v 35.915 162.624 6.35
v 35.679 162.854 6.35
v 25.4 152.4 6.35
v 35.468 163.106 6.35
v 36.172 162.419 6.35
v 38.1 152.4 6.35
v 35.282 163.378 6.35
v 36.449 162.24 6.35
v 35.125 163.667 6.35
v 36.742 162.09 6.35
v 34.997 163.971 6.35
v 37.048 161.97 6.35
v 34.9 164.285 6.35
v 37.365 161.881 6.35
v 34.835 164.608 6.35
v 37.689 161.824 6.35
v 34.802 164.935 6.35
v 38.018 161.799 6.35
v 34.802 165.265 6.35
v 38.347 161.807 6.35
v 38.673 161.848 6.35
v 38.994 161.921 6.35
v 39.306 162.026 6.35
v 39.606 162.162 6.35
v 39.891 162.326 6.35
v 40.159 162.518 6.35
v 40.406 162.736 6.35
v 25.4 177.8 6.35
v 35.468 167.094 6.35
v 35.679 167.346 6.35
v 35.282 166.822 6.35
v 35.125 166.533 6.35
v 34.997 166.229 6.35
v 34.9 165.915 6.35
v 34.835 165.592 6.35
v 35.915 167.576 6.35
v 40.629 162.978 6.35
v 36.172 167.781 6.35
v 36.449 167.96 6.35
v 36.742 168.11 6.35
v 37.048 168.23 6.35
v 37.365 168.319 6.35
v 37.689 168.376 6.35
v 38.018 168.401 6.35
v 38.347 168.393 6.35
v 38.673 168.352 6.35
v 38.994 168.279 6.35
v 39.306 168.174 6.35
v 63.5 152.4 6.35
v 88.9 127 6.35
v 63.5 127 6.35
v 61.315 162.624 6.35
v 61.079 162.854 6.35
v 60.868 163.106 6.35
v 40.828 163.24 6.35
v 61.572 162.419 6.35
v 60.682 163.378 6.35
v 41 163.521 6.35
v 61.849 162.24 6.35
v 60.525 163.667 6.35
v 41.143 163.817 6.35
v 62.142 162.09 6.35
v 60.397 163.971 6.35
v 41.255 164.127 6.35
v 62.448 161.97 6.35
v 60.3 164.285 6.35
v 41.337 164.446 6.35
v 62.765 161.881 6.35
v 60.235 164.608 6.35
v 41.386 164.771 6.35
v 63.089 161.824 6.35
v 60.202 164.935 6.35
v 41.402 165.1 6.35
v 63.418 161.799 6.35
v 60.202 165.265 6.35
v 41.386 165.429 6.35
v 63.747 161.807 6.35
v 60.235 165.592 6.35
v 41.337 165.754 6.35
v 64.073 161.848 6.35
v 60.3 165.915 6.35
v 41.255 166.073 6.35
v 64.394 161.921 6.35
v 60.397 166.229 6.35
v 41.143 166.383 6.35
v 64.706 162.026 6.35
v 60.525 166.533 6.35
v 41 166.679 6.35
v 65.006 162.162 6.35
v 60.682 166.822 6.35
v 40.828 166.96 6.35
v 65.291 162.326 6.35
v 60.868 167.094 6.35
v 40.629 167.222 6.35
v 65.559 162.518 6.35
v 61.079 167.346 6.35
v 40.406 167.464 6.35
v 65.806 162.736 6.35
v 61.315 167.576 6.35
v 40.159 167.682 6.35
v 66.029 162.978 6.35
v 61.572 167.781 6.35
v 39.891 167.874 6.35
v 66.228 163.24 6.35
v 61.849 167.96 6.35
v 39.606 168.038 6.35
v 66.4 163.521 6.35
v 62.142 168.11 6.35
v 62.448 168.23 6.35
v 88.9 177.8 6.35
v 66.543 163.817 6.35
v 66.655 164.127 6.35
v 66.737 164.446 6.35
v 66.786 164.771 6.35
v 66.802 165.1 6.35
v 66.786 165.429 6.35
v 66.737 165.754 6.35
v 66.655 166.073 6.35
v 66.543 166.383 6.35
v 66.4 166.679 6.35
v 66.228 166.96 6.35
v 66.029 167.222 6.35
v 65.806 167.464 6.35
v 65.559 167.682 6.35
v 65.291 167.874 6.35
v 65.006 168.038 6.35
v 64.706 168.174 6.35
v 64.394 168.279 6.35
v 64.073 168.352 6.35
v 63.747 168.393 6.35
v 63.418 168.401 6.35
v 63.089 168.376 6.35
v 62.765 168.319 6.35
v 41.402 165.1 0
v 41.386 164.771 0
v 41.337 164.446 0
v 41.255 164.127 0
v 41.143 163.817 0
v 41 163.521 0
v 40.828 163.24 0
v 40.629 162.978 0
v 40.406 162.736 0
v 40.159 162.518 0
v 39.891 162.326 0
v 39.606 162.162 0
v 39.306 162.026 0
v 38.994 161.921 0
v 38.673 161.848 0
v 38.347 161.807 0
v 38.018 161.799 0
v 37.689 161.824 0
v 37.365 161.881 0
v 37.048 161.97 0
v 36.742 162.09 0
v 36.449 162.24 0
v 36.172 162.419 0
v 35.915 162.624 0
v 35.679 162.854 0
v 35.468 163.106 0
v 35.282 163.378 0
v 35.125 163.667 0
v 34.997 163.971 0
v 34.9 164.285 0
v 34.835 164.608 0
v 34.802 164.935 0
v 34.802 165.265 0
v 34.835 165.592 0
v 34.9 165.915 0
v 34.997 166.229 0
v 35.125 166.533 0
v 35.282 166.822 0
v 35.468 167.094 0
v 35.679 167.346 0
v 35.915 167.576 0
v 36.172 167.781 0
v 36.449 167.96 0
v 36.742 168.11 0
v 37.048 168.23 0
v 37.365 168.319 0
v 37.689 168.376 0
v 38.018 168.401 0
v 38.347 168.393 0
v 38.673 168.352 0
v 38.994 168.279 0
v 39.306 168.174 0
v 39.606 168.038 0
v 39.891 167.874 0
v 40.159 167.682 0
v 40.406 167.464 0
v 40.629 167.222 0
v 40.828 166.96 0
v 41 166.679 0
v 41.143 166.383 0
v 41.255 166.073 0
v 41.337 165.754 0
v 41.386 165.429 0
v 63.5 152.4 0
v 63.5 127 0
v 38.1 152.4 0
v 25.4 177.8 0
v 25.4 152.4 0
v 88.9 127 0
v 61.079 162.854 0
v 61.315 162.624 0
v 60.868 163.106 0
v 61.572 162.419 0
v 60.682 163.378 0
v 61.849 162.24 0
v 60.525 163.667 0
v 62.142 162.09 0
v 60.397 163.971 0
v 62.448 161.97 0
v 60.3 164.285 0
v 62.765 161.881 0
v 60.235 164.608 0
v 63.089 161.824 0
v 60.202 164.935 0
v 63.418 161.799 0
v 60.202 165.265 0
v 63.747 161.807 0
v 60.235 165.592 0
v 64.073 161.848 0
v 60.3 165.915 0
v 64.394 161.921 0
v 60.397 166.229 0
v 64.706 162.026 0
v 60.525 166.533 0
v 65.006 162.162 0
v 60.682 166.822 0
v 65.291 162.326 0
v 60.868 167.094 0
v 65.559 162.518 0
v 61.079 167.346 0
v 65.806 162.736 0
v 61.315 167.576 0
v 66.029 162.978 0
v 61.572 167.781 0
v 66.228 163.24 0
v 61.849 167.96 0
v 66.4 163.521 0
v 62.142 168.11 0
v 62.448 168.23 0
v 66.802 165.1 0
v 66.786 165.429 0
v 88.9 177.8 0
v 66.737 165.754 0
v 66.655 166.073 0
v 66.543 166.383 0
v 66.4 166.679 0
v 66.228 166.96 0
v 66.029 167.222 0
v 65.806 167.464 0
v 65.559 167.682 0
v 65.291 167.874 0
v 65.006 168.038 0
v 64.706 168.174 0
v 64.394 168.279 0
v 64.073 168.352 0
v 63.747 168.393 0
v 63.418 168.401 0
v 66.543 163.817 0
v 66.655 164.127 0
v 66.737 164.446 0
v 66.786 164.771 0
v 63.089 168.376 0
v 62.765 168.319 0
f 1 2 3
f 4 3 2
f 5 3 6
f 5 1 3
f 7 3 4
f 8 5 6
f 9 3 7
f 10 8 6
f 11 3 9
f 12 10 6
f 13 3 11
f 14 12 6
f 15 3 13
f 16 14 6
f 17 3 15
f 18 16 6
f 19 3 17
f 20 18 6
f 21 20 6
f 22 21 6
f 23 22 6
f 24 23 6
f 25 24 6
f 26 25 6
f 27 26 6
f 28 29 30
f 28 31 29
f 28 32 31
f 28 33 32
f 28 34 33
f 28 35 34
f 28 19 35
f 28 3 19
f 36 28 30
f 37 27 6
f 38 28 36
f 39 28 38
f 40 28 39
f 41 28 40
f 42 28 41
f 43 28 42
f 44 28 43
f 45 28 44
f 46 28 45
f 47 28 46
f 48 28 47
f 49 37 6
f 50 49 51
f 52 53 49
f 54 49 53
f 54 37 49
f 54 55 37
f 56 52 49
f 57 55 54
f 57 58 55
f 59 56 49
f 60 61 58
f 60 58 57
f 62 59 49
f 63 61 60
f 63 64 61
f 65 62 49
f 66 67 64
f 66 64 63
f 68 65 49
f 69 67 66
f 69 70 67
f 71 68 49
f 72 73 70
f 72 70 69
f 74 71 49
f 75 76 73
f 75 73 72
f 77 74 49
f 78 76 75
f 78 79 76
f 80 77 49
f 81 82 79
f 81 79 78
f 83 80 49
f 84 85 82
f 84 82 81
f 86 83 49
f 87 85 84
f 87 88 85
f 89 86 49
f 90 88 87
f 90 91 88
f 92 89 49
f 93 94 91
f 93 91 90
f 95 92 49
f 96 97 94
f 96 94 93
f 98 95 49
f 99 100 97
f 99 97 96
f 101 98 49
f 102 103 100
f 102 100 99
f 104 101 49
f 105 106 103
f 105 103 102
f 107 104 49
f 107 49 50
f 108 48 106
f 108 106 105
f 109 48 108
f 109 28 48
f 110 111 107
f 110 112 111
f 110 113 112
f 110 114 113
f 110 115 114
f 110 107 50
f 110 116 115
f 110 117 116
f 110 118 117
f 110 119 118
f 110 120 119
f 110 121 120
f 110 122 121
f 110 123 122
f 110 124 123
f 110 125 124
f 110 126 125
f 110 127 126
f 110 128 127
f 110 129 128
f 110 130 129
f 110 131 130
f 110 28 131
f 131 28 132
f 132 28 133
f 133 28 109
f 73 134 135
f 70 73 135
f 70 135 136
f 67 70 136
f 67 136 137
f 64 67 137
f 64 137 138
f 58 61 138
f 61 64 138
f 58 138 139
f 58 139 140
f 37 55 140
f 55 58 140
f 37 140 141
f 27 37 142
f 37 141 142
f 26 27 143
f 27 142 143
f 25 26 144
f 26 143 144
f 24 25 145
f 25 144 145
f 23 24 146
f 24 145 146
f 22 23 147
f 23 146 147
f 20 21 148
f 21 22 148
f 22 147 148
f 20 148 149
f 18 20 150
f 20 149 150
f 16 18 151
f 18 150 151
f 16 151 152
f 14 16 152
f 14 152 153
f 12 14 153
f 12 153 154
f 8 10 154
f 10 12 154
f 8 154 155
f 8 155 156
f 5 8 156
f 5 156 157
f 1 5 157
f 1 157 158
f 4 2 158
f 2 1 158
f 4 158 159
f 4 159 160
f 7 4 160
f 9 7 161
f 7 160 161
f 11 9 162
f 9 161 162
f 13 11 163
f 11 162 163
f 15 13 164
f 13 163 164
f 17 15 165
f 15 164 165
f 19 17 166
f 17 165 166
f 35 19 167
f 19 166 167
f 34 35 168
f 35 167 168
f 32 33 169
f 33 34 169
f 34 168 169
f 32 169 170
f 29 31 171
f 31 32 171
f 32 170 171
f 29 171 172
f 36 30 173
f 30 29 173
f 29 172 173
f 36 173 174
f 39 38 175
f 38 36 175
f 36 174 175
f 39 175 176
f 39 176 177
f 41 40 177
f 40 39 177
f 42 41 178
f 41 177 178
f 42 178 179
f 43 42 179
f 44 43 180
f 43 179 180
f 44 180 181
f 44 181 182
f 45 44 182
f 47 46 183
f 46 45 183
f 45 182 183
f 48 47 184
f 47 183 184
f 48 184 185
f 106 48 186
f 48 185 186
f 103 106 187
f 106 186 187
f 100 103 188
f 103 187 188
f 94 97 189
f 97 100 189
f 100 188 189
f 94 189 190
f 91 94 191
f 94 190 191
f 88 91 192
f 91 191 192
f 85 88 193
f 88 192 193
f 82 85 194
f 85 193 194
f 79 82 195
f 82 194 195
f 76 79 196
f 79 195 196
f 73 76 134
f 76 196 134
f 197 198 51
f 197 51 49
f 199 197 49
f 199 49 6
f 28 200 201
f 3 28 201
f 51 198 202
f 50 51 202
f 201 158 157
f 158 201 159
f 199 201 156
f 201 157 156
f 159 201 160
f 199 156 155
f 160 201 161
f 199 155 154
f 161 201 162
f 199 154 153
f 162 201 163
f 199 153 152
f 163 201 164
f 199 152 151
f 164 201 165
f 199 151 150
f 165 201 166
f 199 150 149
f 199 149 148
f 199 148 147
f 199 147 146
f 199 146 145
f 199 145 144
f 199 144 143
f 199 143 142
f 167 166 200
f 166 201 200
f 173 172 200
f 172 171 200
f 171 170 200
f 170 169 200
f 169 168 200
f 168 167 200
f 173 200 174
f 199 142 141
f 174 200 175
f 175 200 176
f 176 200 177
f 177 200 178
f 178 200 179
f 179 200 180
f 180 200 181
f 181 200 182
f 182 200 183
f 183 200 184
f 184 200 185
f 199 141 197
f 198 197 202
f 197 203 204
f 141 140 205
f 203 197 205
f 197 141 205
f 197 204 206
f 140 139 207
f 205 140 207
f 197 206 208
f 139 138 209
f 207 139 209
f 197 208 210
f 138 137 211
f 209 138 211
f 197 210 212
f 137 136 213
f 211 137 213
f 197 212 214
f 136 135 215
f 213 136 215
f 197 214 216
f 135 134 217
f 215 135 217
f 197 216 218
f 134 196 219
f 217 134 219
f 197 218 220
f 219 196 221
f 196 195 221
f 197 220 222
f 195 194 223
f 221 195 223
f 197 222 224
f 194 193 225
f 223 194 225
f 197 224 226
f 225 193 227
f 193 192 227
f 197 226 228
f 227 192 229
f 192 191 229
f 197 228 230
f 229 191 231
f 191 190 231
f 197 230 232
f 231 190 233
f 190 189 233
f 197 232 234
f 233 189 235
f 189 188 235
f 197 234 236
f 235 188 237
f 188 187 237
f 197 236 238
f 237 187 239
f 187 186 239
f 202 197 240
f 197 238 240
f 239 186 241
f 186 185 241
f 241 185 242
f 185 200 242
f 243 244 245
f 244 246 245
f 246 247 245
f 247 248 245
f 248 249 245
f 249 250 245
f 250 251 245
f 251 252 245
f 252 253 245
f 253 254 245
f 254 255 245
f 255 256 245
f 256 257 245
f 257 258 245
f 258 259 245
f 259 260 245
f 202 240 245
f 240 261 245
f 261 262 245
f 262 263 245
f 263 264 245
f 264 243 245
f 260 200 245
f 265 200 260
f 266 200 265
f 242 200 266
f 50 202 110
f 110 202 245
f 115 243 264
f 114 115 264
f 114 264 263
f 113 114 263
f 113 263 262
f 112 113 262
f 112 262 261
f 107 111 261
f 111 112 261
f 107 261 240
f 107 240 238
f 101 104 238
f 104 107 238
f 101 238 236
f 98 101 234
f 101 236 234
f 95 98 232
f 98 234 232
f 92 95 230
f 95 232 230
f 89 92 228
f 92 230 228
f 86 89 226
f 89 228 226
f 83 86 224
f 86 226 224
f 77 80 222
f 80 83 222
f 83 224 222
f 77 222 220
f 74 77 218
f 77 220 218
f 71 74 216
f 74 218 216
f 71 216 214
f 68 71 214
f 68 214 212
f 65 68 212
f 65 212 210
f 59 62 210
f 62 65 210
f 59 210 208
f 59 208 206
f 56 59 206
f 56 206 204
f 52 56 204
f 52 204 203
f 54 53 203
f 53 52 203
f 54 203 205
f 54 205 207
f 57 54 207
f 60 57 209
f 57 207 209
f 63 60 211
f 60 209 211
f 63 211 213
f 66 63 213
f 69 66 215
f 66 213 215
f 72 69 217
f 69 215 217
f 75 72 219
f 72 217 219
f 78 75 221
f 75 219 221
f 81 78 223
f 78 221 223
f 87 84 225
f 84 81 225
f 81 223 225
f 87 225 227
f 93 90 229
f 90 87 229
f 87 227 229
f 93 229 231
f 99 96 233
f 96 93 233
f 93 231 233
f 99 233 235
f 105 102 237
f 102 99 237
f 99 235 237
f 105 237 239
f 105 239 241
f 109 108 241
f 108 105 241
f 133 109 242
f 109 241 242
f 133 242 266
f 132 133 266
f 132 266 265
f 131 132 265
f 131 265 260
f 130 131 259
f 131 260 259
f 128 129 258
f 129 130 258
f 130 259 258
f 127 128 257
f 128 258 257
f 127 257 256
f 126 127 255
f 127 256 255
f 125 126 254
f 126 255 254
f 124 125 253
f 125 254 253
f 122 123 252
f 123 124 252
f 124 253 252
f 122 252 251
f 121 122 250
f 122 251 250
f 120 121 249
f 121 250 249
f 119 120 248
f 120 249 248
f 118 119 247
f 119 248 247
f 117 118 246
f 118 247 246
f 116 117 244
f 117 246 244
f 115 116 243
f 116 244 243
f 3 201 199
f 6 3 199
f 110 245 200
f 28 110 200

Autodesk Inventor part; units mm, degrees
ref_plane "YZ Plane" through (0, 0, 0) normal (1, 0, 0) x (0, 1, 0)
ref_plane "XZ Plane" through (0, 0, 0) normal (0, 1, 0) x (-1, 0, 0)
ref_plane "XY Plane" through (0, 0, 0) normal (0, 0, 1) x (1, 0, 0)
sketch "Sketch1" plane through (0, 0, 0) normal (0, 0, 1) x (1, 0, 0)
  circle A0 centre (0, 0) radius 5.5 projected
  line L0 (12.6998, 0) -> (-114.3002, 0)
  line L1 (-114.3002, 0) -> (63.4998, 0)
  line L2 (63.4998, 0) -> (63.4998, -152.4)
  line L3 (63.4998, 0) -> (63.4998, 152.4)
  line L4 (63.4998, 152.4) -> (38.0998, 152.4)
  line L5 (63.4998, 152.4) -> (63.4998, 127)
  line L6 (63.4998, 127) -> (88.8998, 127)
  line L7 (88.8998, 127) -> (88.8998, 177.8)
  line L8 (88.8998, 177.8) -> (25.3998, 177.8)
  line L9 (25.3998, 177.8) -> (25.3998, 152.4)
  line L10 (25.3998, 152.4) -> (38.0998, 152.4)
  circle A1 centre (63.5, 165.1) radius 3.5 construction
  circle A2 centre (38.1, 165.1) radius 3.5 construction
  circle A3 centre (63.5, 165.1) radius 3.302
  circle A4 centre (38.1, 165.1) radius 3.302
  point P0 (0, 0)
  dimension "d0" = 127
  dimension "d1" = 177.8
  dimension "d2" = 152.4
  dimension "d3" = 152.4
  dimension "d4" = 25.4
  dimension "d5" = 25.4
  dimension "d6" = 25.4
  dimension "d7" = 50.8
  dimension "d8" = 63.5
  dimension "d11" = 6.604
  dimension "d12" = 6.604
extrude "Extrusion2" add sketch "Sketch1" along normal blind 6.35 contours L3 L4 L10 L9 L8 L7 L6
properties part number "vrRig_v08_breadboardAlignment"
